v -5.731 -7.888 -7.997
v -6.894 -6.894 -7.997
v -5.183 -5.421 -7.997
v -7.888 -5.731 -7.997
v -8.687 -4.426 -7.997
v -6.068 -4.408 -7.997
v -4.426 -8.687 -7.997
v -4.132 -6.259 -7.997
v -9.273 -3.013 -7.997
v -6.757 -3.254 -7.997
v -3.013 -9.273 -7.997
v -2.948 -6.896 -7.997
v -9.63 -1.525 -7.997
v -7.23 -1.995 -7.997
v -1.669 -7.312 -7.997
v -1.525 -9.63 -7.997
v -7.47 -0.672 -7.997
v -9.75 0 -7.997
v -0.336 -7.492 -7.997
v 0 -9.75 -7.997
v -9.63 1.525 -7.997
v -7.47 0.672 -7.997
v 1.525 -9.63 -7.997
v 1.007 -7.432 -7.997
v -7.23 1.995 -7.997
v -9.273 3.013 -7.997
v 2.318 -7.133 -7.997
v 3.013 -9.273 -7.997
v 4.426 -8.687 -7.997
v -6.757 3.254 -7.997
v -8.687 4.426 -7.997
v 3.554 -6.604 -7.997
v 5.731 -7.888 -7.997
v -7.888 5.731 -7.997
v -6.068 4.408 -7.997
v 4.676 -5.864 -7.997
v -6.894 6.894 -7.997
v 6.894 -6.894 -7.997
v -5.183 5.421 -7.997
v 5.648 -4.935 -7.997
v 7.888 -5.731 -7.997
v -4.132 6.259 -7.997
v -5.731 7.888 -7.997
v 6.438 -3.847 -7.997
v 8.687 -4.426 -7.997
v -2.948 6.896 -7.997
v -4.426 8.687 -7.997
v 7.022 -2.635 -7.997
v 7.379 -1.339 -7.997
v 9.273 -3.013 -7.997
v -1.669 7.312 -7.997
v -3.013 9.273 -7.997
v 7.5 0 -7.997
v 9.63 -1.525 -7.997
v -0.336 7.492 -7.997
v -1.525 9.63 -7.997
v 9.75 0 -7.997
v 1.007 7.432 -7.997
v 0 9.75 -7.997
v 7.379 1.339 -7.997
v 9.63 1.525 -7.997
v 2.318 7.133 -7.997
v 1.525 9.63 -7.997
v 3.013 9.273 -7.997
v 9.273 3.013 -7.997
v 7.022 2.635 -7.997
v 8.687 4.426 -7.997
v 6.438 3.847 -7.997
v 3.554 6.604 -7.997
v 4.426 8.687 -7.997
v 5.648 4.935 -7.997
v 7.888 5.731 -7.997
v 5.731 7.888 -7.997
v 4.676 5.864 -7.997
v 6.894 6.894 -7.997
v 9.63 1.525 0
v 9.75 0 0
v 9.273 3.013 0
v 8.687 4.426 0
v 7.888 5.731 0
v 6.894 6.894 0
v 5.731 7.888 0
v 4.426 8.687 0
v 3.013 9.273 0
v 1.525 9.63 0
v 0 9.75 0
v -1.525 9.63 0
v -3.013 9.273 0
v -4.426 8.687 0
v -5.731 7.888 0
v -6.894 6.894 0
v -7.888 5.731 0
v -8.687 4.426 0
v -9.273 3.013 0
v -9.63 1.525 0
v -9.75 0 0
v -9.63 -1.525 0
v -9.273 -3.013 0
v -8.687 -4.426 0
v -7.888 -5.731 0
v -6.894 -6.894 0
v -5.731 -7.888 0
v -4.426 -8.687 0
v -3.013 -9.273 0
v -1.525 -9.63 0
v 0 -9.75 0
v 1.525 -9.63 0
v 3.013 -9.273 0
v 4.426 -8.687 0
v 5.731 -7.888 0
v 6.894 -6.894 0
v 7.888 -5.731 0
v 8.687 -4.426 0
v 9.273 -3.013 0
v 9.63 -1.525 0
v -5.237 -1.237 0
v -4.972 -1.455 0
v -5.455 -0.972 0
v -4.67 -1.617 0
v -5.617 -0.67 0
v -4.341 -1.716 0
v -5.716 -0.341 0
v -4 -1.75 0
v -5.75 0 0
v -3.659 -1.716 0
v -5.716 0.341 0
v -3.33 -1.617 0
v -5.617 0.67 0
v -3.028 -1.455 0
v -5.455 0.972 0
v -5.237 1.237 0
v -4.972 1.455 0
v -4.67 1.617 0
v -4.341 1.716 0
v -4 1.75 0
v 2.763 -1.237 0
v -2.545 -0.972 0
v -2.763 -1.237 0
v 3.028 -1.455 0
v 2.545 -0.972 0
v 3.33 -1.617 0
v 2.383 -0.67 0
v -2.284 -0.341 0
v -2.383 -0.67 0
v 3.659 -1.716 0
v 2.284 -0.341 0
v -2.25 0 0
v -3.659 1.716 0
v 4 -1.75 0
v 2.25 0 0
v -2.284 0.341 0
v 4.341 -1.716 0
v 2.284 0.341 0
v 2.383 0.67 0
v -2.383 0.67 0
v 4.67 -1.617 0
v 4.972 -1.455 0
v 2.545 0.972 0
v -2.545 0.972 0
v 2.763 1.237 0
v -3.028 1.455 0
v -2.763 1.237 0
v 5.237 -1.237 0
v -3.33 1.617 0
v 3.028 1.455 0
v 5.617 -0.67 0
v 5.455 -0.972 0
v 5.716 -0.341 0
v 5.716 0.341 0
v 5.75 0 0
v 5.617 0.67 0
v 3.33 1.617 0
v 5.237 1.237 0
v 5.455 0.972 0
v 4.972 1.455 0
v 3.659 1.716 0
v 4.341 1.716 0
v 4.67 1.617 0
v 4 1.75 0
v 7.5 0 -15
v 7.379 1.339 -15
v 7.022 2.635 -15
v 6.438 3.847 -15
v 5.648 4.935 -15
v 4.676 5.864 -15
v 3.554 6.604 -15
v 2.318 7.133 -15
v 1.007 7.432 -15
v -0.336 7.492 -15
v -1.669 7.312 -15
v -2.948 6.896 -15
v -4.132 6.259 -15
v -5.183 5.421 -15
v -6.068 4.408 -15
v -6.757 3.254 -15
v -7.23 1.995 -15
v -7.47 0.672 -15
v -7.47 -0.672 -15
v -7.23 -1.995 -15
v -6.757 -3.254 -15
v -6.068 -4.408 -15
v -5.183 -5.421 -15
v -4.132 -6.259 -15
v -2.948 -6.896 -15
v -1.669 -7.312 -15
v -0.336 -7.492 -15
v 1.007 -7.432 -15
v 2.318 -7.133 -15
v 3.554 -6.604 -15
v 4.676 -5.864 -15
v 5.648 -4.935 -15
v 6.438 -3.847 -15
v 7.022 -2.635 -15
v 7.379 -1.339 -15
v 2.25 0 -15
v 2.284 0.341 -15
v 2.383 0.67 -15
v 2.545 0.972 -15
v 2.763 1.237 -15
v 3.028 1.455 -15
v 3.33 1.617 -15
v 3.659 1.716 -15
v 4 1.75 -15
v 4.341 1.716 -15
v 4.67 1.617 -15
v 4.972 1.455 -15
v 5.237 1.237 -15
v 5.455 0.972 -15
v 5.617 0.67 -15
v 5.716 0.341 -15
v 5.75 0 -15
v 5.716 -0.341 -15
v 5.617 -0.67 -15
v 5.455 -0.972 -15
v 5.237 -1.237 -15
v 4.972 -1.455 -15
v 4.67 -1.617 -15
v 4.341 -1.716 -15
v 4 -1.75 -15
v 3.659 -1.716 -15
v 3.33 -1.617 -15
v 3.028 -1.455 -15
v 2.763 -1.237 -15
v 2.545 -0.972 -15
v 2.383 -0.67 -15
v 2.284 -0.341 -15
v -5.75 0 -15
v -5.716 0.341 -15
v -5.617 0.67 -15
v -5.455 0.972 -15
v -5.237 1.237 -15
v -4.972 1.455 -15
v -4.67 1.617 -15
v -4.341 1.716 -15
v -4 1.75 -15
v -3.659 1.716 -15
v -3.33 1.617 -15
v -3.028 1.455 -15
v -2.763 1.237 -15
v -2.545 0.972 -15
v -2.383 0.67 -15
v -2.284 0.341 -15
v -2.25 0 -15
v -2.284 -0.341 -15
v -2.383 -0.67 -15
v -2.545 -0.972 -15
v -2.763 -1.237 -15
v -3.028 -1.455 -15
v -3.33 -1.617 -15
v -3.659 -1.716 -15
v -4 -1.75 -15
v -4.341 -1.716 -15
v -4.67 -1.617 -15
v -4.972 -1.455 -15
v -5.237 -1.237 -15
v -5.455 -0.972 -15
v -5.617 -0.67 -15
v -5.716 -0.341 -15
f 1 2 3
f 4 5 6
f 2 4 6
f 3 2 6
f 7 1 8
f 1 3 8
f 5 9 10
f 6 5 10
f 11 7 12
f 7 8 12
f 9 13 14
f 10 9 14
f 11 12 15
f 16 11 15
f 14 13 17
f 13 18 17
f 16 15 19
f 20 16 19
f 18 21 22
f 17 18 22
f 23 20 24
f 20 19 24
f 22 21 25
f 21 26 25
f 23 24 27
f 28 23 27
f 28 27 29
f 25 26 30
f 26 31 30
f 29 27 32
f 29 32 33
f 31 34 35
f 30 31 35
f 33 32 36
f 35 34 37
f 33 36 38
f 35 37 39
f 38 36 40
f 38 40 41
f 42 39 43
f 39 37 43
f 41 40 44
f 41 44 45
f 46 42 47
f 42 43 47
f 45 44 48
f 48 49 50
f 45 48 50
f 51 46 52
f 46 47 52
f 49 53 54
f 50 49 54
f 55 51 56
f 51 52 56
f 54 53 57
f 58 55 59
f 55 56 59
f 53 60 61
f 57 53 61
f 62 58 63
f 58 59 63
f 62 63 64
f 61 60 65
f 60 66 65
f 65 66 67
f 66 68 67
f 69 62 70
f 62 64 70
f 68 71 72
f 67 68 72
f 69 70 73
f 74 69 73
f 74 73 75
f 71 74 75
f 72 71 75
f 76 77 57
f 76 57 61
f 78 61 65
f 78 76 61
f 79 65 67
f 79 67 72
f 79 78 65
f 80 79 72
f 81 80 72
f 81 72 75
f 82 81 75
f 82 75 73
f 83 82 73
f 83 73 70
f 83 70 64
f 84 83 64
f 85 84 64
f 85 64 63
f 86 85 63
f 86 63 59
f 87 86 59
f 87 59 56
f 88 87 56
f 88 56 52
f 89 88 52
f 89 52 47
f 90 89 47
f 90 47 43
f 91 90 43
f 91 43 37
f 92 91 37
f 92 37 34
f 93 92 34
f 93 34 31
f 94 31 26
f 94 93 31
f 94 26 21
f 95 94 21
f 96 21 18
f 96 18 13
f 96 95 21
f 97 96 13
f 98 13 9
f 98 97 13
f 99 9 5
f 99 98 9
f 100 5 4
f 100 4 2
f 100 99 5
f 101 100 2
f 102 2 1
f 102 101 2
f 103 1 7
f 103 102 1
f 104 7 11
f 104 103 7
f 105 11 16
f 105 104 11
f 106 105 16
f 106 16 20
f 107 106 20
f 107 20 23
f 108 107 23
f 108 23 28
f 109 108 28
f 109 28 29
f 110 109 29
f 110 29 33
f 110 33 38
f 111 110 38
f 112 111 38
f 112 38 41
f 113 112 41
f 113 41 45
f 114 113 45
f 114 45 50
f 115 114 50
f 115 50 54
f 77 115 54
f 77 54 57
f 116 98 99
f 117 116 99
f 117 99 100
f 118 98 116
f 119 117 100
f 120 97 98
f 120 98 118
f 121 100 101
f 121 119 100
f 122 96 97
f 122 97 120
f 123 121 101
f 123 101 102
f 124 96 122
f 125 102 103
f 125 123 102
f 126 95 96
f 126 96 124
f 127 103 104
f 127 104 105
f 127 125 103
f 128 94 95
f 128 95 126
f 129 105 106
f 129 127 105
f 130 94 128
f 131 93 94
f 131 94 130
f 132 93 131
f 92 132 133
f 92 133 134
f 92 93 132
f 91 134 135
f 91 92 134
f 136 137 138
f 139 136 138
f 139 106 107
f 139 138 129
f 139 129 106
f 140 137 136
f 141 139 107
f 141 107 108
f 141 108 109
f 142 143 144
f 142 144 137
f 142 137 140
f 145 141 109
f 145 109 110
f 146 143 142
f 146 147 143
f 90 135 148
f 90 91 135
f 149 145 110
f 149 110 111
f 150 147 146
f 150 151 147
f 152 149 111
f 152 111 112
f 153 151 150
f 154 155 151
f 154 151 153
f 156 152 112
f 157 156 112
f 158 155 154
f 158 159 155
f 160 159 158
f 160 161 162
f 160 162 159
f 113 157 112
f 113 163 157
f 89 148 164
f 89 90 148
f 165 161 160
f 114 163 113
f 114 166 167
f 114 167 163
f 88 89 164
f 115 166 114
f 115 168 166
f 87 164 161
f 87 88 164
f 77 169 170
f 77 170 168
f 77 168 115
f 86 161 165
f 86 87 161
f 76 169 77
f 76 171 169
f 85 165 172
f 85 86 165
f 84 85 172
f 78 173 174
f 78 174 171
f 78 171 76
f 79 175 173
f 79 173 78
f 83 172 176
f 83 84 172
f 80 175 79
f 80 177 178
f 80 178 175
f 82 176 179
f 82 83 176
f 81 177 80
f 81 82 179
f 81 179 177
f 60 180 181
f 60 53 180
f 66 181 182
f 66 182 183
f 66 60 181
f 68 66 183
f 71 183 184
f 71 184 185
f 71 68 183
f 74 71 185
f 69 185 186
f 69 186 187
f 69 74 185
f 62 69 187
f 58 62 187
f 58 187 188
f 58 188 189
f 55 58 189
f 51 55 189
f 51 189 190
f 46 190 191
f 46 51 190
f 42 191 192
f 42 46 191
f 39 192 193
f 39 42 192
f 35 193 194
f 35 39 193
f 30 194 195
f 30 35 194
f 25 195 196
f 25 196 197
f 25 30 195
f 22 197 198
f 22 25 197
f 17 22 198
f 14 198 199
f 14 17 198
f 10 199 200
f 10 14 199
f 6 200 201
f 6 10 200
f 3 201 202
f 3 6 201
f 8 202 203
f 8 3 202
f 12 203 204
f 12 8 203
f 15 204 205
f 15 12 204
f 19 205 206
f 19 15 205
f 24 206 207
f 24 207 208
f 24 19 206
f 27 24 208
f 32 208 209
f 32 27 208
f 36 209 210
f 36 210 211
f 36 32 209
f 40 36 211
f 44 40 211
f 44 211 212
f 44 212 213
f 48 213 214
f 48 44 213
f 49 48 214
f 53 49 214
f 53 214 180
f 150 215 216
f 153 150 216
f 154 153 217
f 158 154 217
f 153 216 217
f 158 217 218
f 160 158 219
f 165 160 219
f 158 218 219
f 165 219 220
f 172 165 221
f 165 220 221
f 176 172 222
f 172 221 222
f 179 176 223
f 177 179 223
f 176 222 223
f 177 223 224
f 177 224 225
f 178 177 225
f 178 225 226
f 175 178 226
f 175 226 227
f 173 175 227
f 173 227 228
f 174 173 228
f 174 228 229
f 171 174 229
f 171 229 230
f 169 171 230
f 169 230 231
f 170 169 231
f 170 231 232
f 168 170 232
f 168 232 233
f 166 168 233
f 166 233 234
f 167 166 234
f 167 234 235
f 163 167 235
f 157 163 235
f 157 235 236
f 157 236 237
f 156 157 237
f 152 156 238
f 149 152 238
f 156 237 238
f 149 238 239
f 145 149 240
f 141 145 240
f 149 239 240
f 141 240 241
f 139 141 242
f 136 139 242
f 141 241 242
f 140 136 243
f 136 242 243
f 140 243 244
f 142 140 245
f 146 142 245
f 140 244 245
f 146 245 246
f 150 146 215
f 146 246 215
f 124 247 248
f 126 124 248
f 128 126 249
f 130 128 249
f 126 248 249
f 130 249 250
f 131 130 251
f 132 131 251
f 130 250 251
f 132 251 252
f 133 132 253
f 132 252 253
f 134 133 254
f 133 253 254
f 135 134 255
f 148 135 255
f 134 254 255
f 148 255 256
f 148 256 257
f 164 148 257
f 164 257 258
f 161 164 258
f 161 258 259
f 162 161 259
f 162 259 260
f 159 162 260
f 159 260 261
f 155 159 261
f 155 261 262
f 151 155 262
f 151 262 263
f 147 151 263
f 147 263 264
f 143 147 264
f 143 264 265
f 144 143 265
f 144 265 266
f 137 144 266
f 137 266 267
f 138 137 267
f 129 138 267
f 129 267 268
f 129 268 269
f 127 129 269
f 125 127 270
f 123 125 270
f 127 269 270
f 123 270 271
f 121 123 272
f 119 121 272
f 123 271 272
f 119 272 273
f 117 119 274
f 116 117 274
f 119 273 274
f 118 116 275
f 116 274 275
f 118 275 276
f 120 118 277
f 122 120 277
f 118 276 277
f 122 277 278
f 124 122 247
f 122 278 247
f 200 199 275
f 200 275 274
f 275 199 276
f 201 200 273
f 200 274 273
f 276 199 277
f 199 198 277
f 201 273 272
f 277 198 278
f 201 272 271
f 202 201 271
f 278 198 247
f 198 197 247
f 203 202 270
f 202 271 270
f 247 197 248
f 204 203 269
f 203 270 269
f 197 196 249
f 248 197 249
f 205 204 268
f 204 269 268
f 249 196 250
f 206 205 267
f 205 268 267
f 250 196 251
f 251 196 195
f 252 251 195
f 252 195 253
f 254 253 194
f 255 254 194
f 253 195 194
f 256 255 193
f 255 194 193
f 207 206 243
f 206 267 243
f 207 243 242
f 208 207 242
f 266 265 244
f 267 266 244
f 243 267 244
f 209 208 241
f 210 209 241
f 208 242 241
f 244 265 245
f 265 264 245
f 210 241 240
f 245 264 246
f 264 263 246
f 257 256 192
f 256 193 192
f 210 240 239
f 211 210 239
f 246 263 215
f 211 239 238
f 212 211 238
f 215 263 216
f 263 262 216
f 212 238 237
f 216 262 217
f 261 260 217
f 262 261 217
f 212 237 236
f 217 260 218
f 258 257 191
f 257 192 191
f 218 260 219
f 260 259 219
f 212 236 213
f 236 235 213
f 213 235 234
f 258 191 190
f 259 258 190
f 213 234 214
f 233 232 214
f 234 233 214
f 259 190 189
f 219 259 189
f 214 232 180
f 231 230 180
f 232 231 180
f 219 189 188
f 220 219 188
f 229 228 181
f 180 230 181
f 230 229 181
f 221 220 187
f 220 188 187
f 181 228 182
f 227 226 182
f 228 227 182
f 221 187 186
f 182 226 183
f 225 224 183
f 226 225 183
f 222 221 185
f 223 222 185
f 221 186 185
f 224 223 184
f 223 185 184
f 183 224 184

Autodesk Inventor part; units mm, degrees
ref_plane "YZ Plane" through (0, 0, 0) normal (1, 0, 0) x (0, 1, 0)
ref_plane "XZ Plane" through (0, 0, 0) normal (0, 1, 0) x (-1, 0, 0)
ref_plane "Work Plane1" through (-12, -12, -7.9972) normal (0, 0, 1) x (1, 0, 0)
sketch "Sketch1" plane through (0, 0, 0) normal (0, 0, 1) x (1, 0, 0)
  circle A0 centre (0, 0) radius 9.75
  circle A1 centre (0, 0) radius 7.5
  dimension "d0" = 19.5
  dimension "d1" = 15
extrude "Extrusion1" add sketch "Sketch1" against normal up to surface (7.9972 mm away) contours A0 | A1
extrude "Extrusion2" add sketch "Sketch1" against normal blind 15 contours A1
sketch "Sketch2" plane through (0, 0, -15) normal (0, 0, -1) x (-1, 0, 0)
  circle A0 centre (4, 0) radius 1.75
  circle A1 centre (-4, 0) radius 1.75
  point P0 (0, 0)
  dimension "d6" = 3.5
  dimension "d7" = 4
  dimension "d8" = 8
extrude "Extrusion3" cut sketch "Sketch2" against normal through all
equation "\"d8\" = 2 * d7"
properties part number "Shaft-1"
